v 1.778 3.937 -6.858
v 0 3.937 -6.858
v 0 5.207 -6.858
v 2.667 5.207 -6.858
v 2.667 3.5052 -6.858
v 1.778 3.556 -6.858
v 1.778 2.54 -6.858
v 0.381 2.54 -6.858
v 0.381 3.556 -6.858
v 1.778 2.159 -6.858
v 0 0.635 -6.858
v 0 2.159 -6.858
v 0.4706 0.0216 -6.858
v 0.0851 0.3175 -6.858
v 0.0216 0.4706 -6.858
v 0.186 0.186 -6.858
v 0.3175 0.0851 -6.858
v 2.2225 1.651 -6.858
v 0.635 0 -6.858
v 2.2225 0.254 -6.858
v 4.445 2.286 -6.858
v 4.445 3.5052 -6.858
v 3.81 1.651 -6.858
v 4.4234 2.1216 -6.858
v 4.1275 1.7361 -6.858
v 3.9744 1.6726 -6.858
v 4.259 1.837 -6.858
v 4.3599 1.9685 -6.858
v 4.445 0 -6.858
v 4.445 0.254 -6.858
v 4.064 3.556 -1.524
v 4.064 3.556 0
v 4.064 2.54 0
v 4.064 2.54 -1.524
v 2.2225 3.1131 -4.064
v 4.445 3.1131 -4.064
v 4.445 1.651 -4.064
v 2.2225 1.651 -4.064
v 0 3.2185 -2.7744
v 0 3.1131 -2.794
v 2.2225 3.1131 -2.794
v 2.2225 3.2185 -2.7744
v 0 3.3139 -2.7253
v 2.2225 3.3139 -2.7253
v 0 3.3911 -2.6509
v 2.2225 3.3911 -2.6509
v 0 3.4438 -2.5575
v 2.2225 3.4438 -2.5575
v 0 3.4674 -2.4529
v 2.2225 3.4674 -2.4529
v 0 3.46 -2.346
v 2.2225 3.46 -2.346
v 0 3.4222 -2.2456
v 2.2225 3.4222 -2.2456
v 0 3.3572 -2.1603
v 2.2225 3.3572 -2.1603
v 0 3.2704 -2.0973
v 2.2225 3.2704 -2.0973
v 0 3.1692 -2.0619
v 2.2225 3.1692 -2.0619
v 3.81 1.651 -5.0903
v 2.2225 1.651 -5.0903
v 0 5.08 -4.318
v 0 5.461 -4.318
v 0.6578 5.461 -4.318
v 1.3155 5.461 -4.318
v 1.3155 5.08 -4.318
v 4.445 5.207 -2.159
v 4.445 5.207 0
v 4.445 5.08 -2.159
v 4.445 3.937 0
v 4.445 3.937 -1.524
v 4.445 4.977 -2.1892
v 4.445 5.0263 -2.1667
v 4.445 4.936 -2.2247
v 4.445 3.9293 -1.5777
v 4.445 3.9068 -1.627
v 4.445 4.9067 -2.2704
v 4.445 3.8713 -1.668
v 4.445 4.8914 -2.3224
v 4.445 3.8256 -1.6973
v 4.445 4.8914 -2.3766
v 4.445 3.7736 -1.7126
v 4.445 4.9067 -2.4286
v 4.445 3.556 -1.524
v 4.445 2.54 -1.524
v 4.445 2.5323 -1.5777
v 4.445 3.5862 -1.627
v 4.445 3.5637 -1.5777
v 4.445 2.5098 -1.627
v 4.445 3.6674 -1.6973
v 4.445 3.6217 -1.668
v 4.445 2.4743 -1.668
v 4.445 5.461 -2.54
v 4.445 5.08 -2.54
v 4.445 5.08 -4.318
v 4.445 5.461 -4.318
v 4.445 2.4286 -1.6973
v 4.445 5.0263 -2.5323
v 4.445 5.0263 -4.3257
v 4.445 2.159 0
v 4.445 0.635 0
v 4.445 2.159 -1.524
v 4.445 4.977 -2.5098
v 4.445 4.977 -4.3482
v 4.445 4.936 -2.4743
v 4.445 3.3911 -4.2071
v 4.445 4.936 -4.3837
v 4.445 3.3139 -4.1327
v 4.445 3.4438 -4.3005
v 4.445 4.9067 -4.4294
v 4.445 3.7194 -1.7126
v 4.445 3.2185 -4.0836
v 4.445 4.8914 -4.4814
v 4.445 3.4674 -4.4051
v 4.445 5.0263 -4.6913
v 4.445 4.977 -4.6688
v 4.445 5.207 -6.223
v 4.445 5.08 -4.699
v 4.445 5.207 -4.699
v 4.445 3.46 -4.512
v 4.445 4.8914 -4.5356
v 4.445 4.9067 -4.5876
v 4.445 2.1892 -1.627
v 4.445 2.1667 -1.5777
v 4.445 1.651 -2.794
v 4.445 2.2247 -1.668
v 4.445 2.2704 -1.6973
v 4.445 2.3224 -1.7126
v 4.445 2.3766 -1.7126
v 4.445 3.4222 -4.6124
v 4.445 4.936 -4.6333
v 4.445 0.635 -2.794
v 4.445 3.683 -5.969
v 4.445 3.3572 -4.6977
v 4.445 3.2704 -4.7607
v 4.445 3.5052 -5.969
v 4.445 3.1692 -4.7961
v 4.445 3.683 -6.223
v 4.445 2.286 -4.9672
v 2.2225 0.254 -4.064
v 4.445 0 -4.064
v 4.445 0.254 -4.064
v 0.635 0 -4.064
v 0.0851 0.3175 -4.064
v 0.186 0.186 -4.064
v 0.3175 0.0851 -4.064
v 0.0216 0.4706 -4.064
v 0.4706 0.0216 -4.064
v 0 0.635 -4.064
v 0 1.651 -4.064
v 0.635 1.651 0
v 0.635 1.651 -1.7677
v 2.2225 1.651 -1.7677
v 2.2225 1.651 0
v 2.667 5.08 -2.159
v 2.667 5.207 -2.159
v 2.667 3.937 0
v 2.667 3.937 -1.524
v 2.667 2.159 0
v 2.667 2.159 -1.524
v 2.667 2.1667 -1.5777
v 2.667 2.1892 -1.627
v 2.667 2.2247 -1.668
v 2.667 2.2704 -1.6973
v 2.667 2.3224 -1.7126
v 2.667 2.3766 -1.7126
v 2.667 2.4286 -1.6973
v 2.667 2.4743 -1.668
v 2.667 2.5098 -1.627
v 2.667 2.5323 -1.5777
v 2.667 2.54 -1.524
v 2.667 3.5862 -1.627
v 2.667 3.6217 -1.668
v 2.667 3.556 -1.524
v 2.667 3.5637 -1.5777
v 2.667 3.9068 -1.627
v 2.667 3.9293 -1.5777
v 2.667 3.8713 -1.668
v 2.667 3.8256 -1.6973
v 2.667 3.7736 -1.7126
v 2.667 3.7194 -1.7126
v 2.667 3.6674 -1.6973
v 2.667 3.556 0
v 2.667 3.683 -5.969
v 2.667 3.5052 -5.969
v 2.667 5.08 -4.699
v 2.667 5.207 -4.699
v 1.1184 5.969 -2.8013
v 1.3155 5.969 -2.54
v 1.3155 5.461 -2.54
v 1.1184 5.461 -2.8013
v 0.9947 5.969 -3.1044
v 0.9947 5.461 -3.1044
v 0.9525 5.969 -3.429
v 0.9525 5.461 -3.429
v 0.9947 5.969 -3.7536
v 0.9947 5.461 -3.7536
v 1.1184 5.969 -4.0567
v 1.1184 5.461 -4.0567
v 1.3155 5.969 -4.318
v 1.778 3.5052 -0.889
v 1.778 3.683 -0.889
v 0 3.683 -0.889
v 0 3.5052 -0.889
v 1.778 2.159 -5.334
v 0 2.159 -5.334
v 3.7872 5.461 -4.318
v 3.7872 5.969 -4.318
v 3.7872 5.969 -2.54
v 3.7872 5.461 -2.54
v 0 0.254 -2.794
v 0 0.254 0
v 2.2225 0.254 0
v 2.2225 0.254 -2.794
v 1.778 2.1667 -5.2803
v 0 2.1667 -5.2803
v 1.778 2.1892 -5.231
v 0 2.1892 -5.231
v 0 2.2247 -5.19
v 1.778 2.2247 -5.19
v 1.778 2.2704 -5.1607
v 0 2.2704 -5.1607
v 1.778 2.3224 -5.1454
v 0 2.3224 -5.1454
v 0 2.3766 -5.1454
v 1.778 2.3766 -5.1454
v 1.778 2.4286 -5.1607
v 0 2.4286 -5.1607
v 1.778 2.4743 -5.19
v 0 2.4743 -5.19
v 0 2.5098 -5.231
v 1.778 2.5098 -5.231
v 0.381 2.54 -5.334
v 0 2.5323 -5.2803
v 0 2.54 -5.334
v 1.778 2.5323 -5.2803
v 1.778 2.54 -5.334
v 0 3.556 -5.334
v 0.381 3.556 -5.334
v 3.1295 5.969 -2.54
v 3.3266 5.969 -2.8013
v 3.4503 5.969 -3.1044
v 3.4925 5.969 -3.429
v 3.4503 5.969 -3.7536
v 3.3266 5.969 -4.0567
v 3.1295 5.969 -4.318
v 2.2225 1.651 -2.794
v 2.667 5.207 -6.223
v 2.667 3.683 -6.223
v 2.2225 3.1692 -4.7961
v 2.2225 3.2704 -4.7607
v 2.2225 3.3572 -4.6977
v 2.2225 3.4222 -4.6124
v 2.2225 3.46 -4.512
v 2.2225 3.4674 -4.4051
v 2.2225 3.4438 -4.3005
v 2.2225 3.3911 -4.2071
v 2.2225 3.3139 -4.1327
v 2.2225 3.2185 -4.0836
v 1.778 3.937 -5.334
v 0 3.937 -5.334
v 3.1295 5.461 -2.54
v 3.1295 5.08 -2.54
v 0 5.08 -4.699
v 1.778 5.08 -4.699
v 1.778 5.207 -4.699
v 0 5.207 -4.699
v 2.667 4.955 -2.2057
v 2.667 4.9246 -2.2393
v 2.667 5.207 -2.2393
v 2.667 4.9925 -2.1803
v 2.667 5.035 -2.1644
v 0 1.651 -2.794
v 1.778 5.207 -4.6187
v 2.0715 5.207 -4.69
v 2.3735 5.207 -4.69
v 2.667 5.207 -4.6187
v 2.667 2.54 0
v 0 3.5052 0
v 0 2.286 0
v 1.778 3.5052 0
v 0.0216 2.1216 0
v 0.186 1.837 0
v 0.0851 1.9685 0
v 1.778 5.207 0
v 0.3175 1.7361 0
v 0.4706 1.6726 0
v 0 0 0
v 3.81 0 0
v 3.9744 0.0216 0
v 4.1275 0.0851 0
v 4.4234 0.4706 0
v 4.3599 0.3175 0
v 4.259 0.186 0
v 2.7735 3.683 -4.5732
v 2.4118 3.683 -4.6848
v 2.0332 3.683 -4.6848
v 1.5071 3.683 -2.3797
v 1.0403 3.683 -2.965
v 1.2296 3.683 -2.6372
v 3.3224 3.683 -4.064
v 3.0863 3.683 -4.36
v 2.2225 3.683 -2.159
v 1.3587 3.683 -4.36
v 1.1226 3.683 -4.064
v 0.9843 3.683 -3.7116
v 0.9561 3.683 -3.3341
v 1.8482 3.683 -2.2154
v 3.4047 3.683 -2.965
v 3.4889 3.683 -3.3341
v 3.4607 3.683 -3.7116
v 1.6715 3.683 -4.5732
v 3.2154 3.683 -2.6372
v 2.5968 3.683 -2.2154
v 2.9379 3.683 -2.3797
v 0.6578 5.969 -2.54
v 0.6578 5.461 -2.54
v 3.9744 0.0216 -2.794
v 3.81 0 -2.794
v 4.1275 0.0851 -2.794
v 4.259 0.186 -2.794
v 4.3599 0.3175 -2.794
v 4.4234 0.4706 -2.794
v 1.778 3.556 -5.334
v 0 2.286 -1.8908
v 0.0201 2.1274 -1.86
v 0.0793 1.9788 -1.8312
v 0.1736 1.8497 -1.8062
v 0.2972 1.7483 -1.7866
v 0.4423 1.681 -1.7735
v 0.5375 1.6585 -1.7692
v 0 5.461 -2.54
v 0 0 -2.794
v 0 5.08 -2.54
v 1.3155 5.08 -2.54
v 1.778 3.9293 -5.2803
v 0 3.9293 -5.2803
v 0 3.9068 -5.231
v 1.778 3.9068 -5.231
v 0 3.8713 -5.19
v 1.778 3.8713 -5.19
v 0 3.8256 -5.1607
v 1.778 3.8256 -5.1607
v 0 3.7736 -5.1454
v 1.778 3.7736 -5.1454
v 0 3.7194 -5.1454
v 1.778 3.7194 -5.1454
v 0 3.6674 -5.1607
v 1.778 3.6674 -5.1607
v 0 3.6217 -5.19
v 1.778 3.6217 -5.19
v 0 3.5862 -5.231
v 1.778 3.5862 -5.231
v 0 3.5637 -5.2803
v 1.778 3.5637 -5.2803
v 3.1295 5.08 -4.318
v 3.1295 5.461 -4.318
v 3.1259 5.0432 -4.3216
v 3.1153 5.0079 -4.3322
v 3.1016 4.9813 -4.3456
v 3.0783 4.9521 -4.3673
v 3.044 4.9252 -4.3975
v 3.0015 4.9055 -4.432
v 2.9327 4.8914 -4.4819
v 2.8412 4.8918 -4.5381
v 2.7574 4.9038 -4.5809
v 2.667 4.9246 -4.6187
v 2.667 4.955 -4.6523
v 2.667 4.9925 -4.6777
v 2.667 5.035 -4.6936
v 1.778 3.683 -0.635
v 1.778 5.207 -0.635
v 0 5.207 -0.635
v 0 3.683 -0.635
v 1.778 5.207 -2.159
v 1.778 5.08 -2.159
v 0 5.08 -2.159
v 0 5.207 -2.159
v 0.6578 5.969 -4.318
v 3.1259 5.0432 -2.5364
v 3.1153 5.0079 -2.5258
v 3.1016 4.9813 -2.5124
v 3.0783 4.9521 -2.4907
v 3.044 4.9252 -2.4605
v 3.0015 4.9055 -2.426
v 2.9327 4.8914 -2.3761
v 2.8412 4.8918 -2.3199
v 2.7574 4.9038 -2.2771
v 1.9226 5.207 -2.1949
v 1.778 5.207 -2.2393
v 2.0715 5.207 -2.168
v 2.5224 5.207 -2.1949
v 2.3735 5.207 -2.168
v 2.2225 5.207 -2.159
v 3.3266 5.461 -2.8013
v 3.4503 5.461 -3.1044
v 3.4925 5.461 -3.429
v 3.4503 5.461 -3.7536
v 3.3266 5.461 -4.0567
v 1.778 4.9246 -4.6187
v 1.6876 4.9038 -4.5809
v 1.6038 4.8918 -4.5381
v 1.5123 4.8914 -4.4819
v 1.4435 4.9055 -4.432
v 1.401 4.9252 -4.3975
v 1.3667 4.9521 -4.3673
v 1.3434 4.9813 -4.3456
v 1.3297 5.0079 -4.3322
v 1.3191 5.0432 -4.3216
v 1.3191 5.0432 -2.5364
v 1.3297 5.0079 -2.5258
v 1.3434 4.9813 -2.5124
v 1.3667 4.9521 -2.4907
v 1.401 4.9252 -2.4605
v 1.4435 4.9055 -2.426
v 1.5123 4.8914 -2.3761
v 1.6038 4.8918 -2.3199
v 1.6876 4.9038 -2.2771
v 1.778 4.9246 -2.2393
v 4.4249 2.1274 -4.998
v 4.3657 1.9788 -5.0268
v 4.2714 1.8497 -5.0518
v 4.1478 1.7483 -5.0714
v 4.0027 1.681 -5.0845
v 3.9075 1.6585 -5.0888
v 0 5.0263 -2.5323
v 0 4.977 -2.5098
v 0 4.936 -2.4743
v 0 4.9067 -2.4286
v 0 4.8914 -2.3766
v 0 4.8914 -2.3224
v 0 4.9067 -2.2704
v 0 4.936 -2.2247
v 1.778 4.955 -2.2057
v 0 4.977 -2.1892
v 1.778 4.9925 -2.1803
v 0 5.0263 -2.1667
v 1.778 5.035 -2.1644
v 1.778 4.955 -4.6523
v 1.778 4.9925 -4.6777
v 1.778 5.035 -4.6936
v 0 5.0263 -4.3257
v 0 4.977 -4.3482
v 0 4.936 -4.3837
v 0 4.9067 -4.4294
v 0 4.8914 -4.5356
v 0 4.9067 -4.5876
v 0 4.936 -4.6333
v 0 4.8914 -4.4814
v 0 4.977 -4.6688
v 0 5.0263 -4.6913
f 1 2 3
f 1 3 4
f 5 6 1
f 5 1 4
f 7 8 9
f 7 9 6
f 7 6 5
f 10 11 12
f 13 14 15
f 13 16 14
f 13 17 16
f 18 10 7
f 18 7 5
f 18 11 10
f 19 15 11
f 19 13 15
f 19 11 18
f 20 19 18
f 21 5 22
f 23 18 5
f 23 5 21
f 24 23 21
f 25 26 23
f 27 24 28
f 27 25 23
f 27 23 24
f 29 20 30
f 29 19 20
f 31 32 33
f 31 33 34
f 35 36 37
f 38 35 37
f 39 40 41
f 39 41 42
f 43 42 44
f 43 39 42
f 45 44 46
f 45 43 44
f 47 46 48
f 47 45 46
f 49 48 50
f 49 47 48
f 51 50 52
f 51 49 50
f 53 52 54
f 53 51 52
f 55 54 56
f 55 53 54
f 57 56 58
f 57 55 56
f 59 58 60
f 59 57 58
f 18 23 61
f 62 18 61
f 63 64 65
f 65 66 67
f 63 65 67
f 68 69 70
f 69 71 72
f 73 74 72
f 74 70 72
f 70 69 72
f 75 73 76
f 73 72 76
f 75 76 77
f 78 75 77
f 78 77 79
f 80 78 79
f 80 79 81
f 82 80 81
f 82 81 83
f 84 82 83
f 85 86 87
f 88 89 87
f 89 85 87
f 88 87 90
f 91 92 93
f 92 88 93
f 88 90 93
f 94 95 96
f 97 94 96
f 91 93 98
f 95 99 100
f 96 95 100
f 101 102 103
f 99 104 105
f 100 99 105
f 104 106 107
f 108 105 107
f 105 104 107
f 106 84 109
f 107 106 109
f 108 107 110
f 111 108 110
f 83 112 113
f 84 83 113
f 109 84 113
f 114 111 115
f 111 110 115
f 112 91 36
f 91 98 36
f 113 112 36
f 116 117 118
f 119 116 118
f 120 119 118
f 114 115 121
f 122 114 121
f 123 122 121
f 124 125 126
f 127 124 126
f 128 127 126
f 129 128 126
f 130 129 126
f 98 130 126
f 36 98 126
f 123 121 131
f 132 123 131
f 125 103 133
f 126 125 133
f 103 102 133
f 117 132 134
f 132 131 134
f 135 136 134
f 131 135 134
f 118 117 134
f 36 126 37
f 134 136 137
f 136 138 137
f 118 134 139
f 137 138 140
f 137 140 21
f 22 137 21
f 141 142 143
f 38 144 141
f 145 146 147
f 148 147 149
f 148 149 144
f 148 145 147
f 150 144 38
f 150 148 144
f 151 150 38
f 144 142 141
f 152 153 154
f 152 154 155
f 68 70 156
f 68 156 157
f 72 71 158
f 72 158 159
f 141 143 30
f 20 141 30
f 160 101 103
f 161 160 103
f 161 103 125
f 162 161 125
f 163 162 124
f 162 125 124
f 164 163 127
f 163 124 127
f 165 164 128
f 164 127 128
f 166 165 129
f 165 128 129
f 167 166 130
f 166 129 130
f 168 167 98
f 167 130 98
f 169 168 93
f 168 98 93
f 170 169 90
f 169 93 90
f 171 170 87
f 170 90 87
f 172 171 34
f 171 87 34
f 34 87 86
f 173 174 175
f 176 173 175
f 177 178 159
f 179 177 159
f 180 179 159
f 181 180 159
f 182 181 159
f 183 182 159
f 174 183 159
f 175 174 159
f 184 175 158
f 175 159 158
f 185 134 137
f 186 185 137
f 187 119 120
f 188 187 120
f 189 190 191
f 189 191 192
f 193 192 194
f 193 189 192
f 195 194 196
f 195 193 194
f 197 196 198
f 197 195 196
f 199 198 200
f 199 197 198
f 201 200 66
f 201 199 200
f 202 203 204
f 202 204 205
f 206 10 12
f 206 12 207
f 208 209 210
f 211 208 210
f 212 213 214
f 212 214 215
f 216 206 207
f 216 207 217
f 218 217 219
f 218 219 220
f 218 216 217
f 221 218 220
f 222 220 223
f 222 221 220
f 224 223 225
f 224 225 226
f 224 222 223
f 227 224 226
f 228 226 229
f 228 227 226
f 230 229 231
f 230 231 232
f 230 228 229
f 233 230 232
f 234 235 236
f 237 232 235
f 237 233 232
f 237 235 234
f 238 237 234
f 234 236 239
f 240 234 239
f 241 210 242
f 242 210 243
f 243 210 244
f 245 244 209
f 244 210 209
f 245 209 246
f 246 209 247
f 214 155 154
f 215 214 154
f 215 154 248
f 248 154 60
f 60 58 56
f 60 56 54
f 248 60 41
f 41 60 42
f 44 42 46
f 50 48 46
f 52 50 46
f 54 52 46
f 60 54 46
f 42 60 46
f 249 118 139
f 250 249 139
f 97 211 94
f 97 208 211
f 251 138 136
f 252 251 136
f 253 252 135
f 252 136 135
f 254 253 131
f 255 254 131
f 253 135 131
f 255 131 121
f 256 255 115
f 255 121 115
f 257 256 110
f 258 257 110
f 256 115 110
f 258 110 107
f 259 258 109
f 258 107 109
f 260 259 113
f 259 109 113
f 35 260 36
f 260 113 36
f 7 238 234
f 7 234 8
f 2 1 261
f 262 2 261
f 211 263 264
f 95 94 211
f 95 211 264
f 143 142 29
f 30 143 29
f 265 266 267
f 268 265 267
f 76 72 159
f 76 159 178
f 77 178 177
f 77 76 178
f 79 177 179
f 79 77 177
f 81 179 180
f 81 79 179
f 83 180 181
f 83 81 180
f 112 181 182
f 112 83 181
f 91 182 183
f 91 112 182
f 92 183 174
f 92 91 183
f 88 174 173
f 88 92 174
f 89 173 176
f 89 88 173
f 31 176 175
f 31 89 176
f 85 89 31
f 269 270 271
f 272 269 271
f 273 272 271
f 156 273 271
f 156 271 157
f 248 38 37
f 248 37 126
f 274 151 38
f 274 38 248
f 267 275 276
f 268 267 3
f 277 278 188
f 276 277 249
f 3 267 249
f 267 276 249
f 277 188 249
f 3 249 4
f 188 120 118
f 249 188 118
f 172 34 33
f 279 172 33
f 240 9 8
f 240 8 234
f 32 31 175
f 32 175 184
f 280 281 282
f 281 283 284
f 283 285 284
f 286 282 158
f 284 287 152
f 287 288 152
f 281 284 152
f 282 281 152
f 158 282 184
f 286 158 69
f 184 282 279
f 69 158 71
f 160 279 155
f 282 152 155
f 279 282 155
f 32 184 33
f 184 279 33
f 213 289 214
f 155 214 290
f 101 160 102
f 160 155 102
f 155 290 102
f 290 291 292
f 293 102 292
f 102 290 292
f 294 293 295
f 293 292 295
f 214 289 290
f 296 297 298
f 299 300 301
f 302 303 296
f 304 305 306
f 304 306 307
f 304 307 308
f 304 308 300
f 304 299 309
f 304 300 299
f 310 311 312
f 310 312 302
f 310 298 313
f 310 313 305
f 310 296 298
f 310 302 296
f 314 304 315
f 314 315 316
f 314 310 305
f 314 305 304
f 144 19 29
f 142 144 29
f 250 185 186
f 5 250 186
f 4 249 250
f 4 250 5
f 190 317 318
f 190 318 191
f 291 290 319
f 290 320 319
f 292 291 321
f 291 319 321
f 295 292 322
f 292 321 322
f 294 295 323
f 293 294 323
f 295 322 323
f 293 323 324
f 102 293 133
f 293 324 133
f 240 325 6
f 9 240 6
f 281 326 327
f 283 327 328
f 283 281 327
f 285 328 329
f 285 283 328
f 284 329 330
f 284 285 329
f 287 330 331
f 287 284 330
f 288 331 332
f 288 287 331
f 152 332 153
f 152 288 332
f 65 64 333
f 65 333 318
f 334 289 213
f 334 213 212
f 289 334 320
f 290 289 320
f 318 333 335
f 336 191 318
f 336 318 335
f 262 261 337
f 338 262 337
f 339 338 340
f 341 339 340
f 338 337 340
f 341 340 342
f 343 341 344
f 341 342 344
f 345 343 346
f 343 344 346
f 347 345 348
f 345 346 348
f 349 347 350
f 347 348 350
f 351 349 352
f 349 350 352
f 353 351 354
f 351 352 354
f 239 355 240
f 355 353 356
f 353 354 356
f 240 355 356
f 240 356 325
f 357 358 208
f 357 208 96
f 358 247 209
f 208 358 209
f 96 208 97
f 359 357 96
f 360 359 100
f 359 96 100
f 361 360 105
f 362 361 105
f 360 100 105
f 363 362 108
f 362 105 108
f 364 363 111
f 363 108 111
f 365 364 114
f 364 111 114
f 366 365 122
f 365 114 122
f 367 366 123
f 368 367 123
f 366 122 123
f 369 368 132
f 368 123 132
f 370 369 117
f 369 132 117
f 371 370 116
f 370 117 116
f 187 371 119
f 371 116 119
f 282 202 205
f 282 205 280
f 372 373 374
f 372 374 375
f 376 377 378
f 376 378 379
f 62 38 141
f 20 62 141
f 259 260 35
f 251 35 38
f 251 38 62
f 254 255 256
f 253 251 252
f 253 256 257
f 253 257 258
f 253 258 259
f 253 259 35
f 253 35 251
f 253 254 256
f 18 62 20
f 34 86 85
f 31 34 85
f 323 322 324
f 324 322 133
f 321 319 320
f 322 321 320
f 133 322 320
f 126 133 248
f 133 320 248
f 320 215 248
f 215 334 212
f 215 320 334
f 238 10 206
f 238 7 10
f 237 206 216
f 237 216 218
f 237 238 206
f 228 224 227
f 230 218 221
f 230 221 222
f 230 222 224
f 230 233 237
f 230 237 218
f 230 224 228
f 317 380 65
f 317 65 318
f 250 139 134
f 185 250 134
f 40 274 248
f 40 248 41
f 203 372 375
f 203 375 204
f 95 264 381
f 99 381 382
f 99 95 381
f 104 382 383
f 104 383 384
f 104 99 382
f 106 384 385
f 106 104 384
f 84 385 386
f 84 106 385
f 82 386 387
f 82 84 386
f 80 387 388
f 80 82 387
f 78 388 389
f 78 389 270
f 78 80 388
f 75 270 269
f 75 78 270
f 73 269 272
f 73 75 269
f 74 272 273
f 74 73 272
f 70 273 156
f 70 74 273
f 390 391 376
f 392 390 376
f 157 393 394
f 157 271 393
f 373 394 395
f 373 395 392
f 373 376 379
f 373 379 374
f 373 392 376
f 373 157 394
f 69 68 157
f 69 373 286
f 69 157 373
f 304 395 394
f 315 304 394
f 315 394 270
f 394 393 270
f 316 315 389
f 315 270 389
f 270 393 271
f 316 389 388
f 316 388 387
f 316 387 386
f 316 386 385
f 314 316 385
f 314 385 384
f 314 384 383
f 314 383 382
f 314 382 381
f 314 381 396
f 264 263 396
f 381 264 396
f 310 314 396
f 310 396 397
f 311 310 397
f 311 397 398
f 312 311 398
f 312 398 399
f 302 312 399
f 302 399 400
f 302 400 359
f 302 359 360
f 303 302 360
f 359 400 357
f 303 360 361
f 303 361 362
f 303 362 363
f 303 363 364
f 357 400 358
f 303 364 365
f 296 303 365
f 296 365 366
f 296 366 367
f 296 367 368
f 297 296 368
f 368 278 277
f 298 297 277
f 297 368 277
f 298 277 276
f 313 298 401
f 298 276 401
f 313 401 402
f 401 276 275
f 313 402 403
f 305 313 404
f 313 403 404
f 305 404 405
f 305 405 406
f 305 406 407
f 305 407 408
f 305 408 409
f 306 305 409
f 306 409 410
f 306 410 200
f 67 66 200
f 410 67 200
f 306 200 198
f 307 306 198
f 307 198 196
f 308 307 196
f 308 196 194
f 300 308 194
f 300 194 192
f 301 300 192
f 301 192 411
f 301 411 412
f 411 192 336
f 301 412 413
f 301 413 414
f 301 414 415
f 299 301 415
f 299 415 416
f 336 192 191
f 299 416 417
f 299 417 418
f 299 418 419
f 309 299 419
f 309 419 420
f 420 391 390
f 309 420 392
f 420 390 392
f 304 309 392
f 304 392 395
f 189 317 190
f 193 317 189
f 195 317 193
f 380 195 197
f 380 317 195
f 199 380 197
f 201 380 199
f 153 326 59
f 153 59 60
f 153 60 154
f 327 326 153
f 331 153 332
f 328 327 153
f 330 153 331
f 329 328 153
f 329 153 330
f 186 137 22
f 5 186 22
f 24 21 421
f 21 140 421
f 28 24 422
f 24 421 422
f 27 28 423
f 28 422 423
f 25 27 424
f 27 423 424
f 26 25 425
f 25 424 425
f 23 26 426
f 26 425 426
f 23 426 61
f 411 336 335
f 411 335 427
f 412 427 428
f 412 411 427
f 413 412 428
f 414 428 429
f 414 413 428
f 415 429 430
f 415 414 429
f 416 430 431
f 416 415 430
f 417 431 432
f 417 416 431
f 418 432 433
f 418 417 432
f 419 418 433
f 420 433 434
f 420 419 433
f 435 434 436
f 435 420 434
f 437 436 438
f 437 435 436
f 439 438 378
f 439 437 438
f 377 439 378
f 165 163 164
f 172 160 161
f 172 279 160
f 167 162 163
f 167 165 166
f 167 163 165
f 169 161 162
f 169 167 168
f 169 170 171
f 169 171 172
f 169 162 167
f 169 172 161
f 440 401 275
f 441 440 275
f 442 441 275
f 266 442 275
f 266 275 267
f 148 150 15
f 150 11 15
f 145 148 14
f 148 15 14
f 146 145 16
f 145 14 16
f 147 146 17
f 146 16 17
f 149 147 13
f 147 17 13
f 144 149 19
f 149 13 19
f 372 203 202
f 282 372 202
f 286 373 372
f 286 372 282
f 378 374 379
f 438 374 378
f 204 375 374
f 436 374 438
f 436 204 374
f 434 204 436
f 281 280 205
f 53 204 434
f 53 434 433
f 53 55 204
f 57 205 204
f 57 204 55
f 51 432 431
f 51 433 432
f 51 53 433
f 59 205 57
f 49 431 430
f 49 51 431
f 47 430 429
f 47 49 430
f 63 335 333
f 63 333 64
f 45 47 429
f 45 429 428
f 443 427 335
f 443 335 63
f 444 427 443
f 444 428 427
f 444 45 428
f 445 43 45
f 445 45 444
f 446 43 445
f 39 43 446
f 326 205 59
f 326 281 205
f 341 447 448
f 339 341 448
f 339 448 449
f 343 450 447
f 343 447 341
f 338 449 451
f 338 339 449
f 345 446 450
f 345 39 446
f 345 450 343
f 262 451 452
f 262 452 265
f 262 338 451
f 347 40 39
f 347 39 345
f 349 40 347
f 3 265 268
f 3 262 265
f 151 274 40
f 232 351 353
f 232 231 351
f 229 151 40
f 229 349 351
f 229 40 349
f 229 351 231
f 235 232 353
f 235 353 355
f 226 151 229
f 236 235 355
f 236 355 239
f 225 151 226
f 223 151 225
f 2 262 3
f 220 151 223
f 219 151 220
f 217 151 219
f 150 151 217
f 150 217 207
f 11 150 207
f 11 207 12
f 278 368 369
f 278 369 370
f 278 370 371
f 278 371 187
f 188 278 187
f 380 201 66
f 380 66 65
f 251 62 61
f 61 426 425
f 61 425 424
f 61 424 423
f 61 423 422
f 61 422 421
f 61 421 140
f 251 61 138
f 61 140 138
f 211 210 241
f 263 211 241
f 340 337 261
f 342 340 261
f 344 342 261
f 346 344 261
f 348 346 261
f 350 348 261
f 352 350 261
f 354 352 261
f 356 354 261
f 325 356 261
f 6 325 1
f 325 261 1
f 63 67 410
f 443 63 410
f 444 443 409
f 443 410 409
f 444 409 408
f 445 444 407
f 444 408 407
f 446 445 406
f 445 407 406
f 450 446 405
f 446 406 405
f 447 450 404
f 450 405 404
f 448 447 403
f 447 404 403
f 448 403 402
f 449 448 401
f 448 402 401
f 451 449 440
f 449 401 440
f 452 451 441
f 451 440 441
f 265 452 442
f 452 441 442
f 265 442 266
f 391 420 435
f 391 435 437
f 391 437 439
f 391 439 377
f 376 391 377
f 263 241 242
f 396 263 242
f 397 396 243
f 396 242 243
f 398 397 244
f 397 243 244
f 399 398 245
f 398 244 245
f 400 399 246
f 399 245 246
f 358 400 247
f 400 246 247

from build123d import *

# Parameters (mm, degrees)
SKETCH1_W           = 4.445
SKETCH1_H           = 6.858
BOSS_EXTRUDE1_DEPTH = 5.461
SKETCH2_R           = 1.27
CUT_EXTRUDE1_DEPTH  = 1.778
SKETCH3_W           = 1.27
SKETCH3_H           = 3.302
CUT_EXTRUDE2_DEPTH  = 10.829176466
CUT_EXTRUDE3_DEPTH  = 2.2225
CUT_EXTRUDE4_DEPTH  = 2.2225
CUT_EXTRUDE6_DEPTH  = 1.778
CUT_EXTRUDE7_START  = -1.778
CUT_EXTRUDE7_DEPTH  = 1.778
FILLET1_R           = 0.635
SKETCH14_W          = 0.889
SKETCH14_H          = 0.254
CUT_EXTRUDE8_DEPTH  = 10.829176567
BOSS_EXTRUDE2_START = 0.508
BOSS_EXTRUDE2_DEPTH = 0.508
SKETCH16_W          = 1.524
SKETCH16_H          = 1.016
CUT_EXTRUDE9_DEPTH  = 0.381
SKETCH17_W          = 1.524
SKETCH17_H          = 1.016
CUT_EXTRUDE10_DEPTH = 0.381


with BuildPart() as part:
    # Sketch1 → Boss-Extrude1 (new body)
    with BuildSketch(Plane(origin=(0, 0, 0), x_dir=(1, 0, 0), z_dir=(0, 1, 0))):
        with Locations((2.2225, 3.429)):
            Rectangle(SKETCH1_W, SKETCH1_H)
    extrude(amount=BOSS_EXTRUDE1_DEPTH)

    # Sketch2 → Cut-Extrude1 (cut)
    with BuildSketch(Plane(origin=(0, 5.461, 0), x_dir=(1, 0, 0), z_dir=(0, 1, 0))):
        with Locations(Location((2.2225, 3.429, 0), (0, 0, 270))):
            Circle(SKETCH2_R)
    extrude(amount=-CUT_EXTRUDE1_DEPTH, mode=Mode.SUBTRACT)

    # Sketch3 → Cut-Extrude2 (cut, through all)
    with BuildSketch(Plane.ZY):
        with Locations((-3.429, 0)):
            Rectangle(SKETCH3_W, SKETCH3_H)
    extrude(amount=-CUT_EXTRUDE2_DEPTH, mode=Mode.SUBTRACT)

    # Sketch4 → Cut-Extrude3 (cut)
    with BuildSketch(Plane.ZY):
        with BuildLine():
            Line((-2.794, 1.651), (-2.794, 3.11311482))
            ThreePointArc((-2.794, 3.11311482), (-2.452929401, 3.467407127), (-2.061869299, 3.169205537))
            Line((-2.061869299, 3.169205537), (-1.767735227, 1.651))
            Line((-1.767735227, 1.651), (0, 1.651))
            Line((0, 1.651), (0, 0.254))
            Line((0, 0.254), (-2.794, 0.254))
            Line((-2.794, 0.254), (-2.794, 1.651))
        make_face()
    extrude(amount=-CUT_EXTRUDE3_DEPTH, mode=Mode.SUBTRACT)

    # Sketch11 → Cut-Extrude4 (cut)
    with BuildSketch(Plane(origin=(4.445, 0, 0), x_dir=(0, 0, -1), z_dir=(1, 0, 0))):
        with BuildLine():
            Line((6.858, 0.254), (6.858, 1.651))
            Line((6.858, 1.651), (5.090264773, 1.651))
            Line((5.090264773, 1.651), (4.796130701, 3.169205537))
            ThreePointArc((4.796130701, 3.169205537), (4.405070599, 3.467407127), (4.064, 3.11311482))
            Line((4.064, 3.11311482), (4.064, 1.651))
            Line((4.064, 1.651), (4.064, 0.254))
            Line((4.064, 0.254), (6.858, 0.254))
        make_face()
    extrude(amount=-CUT_EXTRUDE4_DEPTH, mode=Mode.SUBTRACT)

    # Sketch12 → Cut-Extrude6 (cut)
    with BuildSketch(Plane(origin=(4.445, 0, 0), x_dir=(0, 0, -1), z_dir=(1, 0, 0))):
        with BuildLine():
            Line((0, 2.159), (1.524, 2.159))
            ThreePointArc((1.524, 2.159), (1.7145, 2.3495), (1.524, 2.54))
            Line((1.524, 2.54), (0, 2.54))
            Line((0, 2.54), (0, 2.159))
        make_face()
        with BuildLine():
            Line((0, 3.937), (1.524, 3.937))
            ThreePointArc((1.524, 3.937), (1.7145, 3.7465), (1.524, 3.556))
            Line((1.524, 3.556), (0, 3.556))
            Line((0, 3.556), (0, 3.937))
        make_face()
        with BuildLine():
            Line((2.54, 5.207), (2.54, 5.08))
            ThreePointArc((2.54, 5.08), (2.3495, 4.8895), (2.159, 5.08))
            Line((2.159, 5.08), (2.159, 5.207))
            Line((2.159, 5.207), (0, 5.207))
            Line((0, 5.207), (0, 5.461))
            Line((0, 5.461), (2.54, 5.461))
            Line((2.54, 5.461), (2.54, 5.207))
        make_face()
        with BuildLine():
            Line((4.699, 5.08), (4.699, 5.207))
            Line((4.699, 5.207), (6.223, 5.207))
            Line((6.223, 5.207), (6.223, 3.683))
            Line((6.223, 3.683), (5.969, 3.683))
            Line((5.969, 3.683), (5.969, 3.5052))
            Line((5.969, 3.5052), (6.858, 3.5052))
            Line((6.858, 3.5052), (6.858, 5.461))
            Line((6.858, 5.461), (4.318, 5.461))
            Line((4.318, 5.461), (4.318, 5.207))
            Line((4.318, 5.207), (4.318, 5.08))
            ThreePointArc((4.318, 5.08), (4.5085, 4.8895), (4.699, 5.08))
        make_face()
    extrude(amount=-CUT_EXTRUDE6_DEPTH, mode=Mode.SUBTRACT)

    # Sketch13 → Cut-Extrude7 (cut)
    with BuildSketch(Plane.ZY.offset(CUT_EXTRUDE7_START)):
        with BuildLine():
            Line((-6.858, 2.159), (-5.334, 2.159))
            ThreePointArc((-5.334, 2.159), (-5.1435, 2.3495), (-5.334, 2.54))
            Line((-5.334, 2.54), (-6.858, 2.54))
            Line((-6.858, 2.54), (-6.858, 2.159))
        make_face()
        with BuildLine():
            Line((-6.858, 3.937), (-5.334, 3.937))
            ThreePointArc((-5.334, 3.937), (-5.1435, 3.7465), (-5.334, 3.556))
            Line((-5.334, 3.556), (-6.858, 3.556))
            Line((-6.858, 3.556), (-6.858, 3.937))
        make_face()
        with BuildLine():
            Line((-4.318, 5.207), (-4.318, 5.08))
            ThreePointArc((-4.318, 5.08), (-4.5085, 4.8895), (-4.699, 5.08))
            Line((-4.699, 5.08), (-4.699, 5.207))
            Line((-4.699, 5.207), (-6.858, 5.207))
            Line((-6.858, 5.207), (-6.858, 5.461))
            Line((-6.858, 5.461), (-4.318, 5.461))
            Line((-4.318, 5.461), (-4.318, 5.207))
        make_face()
        with BuildLine():
            Line((-2.159, 5.08), (-2.159, 5.207))
            Line((-2.159, 5.207), (-0.635, 5.207))
            Line((-0.635, 5.207), (-0.635, 3.683))
            Line((-0.635, 3.683), (-0.889, 3.683))
            Line((-0.889, 3.683), (-0.889, 3.5052))
            Line((-0.889, 3.5052), (0, 3.5052))
            Line((0, 3.5052), (0, 5.461))
            Line((0, 5.461), (-2.54, 5.461))
            Line((-2.54, 5.461), (-2.54, 5.207))
            Line((-2.54, 5.207), (-2.54, 5.08))
            ThreePointArc((-2.54, 5.08), (-2.3495, 4.8895), (-2.159, 5.08))
        make_face()
    extrude(amount=CUT_EXTRUDE7_DEPTH, mode=Mode.SUBTRACT)

    # Fillet1
    fillet1_edges = [part.edges().sort_by_distance(p)[0] for p in [
        (0, 1.651, -0.883867613),
        (4.445, 0, -1.397),
        (0, 0, -5.461),
        (4.445, 1.651, -5.974132387),
    ]]
    fillet(fillet1_edges, radius=FILLET1_R)

    # Sketch14 → Cut-Extrude8 (cut, through all)
    with BuildSketch(Plane(origin=(0, 0, -6.858), x_dir=(-1, 0, 0), z_dir=(0, 0, -1))):
        with Locations((-2.2225, 5.334)):
            Rectangle(SKETCH14_W, SKETCH14_H)
    extrude(amount=-CUT_EXTRUDE8_DEPTH, mode=Mode.SUBTRACT)

    # Sketch15 → Boss-Extrude2 (add)
    with BuildSketch(Plane(origin=(0, 5.461, 0), x_dir=(1, 0, 0), z_dir=(0, 1, 0)).offset(BOSS_EXTRUDE2_START)):
        with BuildLine():
            Line((3.12946141, 4.318), (3.787230705, 4.318))
            Line((3.787230705, 4.318), (3.787230705, 2.54))
            Line((3.787230705, 2.54), (3.12946141, 2.54))
            ThreePointArc((3.12946141, 2.54), (3.4925, 3.429), (3.12946141, 4.318))
        make_face()
        with BuildLine():
            Line((1.31553859, 4.318), (0.657769295, 4.318))
            Line((0.657769295, 4.318), (0.657769295, 2.54))
            Line((0.657769295, 2.54), (1.31553859, 2.54))
            ThreePointArc((1.31553859, 2.54), (0.9525, 3.429), (1.31553859, 4.318))
        make_face()
    extrude(amount=-BOSS_EXTRUDE2_DEPTH)

    # Sketch16 → Cut-Extrude9 (cut)
    with BuildSketch(Plane.ZY):
        with Locations((-6.096, 3.048)):
            Rectangle(SKETCH16_W, SKETCH16_H)
    extrude(amount=-CUT_EXTRUDE9_DEPTH, mode=Mode.SUBTRACT)

    # Sketch17 → Cut-Extrude10 (cut)
    with BuildSketch(Plane(origin=(4.445, 0, 0), x_dir=(0, 0, -1), z_dir=(1, 0, 0))):
        with Locations((0.762, 3.048)):
            Rectangle(SKETCH17_W, SKETCH17_H)
    extrude(amount=-CUT_EXTRUDE10_DEPTH, mode=Mode.SUBTRACT)


solid = part.part
